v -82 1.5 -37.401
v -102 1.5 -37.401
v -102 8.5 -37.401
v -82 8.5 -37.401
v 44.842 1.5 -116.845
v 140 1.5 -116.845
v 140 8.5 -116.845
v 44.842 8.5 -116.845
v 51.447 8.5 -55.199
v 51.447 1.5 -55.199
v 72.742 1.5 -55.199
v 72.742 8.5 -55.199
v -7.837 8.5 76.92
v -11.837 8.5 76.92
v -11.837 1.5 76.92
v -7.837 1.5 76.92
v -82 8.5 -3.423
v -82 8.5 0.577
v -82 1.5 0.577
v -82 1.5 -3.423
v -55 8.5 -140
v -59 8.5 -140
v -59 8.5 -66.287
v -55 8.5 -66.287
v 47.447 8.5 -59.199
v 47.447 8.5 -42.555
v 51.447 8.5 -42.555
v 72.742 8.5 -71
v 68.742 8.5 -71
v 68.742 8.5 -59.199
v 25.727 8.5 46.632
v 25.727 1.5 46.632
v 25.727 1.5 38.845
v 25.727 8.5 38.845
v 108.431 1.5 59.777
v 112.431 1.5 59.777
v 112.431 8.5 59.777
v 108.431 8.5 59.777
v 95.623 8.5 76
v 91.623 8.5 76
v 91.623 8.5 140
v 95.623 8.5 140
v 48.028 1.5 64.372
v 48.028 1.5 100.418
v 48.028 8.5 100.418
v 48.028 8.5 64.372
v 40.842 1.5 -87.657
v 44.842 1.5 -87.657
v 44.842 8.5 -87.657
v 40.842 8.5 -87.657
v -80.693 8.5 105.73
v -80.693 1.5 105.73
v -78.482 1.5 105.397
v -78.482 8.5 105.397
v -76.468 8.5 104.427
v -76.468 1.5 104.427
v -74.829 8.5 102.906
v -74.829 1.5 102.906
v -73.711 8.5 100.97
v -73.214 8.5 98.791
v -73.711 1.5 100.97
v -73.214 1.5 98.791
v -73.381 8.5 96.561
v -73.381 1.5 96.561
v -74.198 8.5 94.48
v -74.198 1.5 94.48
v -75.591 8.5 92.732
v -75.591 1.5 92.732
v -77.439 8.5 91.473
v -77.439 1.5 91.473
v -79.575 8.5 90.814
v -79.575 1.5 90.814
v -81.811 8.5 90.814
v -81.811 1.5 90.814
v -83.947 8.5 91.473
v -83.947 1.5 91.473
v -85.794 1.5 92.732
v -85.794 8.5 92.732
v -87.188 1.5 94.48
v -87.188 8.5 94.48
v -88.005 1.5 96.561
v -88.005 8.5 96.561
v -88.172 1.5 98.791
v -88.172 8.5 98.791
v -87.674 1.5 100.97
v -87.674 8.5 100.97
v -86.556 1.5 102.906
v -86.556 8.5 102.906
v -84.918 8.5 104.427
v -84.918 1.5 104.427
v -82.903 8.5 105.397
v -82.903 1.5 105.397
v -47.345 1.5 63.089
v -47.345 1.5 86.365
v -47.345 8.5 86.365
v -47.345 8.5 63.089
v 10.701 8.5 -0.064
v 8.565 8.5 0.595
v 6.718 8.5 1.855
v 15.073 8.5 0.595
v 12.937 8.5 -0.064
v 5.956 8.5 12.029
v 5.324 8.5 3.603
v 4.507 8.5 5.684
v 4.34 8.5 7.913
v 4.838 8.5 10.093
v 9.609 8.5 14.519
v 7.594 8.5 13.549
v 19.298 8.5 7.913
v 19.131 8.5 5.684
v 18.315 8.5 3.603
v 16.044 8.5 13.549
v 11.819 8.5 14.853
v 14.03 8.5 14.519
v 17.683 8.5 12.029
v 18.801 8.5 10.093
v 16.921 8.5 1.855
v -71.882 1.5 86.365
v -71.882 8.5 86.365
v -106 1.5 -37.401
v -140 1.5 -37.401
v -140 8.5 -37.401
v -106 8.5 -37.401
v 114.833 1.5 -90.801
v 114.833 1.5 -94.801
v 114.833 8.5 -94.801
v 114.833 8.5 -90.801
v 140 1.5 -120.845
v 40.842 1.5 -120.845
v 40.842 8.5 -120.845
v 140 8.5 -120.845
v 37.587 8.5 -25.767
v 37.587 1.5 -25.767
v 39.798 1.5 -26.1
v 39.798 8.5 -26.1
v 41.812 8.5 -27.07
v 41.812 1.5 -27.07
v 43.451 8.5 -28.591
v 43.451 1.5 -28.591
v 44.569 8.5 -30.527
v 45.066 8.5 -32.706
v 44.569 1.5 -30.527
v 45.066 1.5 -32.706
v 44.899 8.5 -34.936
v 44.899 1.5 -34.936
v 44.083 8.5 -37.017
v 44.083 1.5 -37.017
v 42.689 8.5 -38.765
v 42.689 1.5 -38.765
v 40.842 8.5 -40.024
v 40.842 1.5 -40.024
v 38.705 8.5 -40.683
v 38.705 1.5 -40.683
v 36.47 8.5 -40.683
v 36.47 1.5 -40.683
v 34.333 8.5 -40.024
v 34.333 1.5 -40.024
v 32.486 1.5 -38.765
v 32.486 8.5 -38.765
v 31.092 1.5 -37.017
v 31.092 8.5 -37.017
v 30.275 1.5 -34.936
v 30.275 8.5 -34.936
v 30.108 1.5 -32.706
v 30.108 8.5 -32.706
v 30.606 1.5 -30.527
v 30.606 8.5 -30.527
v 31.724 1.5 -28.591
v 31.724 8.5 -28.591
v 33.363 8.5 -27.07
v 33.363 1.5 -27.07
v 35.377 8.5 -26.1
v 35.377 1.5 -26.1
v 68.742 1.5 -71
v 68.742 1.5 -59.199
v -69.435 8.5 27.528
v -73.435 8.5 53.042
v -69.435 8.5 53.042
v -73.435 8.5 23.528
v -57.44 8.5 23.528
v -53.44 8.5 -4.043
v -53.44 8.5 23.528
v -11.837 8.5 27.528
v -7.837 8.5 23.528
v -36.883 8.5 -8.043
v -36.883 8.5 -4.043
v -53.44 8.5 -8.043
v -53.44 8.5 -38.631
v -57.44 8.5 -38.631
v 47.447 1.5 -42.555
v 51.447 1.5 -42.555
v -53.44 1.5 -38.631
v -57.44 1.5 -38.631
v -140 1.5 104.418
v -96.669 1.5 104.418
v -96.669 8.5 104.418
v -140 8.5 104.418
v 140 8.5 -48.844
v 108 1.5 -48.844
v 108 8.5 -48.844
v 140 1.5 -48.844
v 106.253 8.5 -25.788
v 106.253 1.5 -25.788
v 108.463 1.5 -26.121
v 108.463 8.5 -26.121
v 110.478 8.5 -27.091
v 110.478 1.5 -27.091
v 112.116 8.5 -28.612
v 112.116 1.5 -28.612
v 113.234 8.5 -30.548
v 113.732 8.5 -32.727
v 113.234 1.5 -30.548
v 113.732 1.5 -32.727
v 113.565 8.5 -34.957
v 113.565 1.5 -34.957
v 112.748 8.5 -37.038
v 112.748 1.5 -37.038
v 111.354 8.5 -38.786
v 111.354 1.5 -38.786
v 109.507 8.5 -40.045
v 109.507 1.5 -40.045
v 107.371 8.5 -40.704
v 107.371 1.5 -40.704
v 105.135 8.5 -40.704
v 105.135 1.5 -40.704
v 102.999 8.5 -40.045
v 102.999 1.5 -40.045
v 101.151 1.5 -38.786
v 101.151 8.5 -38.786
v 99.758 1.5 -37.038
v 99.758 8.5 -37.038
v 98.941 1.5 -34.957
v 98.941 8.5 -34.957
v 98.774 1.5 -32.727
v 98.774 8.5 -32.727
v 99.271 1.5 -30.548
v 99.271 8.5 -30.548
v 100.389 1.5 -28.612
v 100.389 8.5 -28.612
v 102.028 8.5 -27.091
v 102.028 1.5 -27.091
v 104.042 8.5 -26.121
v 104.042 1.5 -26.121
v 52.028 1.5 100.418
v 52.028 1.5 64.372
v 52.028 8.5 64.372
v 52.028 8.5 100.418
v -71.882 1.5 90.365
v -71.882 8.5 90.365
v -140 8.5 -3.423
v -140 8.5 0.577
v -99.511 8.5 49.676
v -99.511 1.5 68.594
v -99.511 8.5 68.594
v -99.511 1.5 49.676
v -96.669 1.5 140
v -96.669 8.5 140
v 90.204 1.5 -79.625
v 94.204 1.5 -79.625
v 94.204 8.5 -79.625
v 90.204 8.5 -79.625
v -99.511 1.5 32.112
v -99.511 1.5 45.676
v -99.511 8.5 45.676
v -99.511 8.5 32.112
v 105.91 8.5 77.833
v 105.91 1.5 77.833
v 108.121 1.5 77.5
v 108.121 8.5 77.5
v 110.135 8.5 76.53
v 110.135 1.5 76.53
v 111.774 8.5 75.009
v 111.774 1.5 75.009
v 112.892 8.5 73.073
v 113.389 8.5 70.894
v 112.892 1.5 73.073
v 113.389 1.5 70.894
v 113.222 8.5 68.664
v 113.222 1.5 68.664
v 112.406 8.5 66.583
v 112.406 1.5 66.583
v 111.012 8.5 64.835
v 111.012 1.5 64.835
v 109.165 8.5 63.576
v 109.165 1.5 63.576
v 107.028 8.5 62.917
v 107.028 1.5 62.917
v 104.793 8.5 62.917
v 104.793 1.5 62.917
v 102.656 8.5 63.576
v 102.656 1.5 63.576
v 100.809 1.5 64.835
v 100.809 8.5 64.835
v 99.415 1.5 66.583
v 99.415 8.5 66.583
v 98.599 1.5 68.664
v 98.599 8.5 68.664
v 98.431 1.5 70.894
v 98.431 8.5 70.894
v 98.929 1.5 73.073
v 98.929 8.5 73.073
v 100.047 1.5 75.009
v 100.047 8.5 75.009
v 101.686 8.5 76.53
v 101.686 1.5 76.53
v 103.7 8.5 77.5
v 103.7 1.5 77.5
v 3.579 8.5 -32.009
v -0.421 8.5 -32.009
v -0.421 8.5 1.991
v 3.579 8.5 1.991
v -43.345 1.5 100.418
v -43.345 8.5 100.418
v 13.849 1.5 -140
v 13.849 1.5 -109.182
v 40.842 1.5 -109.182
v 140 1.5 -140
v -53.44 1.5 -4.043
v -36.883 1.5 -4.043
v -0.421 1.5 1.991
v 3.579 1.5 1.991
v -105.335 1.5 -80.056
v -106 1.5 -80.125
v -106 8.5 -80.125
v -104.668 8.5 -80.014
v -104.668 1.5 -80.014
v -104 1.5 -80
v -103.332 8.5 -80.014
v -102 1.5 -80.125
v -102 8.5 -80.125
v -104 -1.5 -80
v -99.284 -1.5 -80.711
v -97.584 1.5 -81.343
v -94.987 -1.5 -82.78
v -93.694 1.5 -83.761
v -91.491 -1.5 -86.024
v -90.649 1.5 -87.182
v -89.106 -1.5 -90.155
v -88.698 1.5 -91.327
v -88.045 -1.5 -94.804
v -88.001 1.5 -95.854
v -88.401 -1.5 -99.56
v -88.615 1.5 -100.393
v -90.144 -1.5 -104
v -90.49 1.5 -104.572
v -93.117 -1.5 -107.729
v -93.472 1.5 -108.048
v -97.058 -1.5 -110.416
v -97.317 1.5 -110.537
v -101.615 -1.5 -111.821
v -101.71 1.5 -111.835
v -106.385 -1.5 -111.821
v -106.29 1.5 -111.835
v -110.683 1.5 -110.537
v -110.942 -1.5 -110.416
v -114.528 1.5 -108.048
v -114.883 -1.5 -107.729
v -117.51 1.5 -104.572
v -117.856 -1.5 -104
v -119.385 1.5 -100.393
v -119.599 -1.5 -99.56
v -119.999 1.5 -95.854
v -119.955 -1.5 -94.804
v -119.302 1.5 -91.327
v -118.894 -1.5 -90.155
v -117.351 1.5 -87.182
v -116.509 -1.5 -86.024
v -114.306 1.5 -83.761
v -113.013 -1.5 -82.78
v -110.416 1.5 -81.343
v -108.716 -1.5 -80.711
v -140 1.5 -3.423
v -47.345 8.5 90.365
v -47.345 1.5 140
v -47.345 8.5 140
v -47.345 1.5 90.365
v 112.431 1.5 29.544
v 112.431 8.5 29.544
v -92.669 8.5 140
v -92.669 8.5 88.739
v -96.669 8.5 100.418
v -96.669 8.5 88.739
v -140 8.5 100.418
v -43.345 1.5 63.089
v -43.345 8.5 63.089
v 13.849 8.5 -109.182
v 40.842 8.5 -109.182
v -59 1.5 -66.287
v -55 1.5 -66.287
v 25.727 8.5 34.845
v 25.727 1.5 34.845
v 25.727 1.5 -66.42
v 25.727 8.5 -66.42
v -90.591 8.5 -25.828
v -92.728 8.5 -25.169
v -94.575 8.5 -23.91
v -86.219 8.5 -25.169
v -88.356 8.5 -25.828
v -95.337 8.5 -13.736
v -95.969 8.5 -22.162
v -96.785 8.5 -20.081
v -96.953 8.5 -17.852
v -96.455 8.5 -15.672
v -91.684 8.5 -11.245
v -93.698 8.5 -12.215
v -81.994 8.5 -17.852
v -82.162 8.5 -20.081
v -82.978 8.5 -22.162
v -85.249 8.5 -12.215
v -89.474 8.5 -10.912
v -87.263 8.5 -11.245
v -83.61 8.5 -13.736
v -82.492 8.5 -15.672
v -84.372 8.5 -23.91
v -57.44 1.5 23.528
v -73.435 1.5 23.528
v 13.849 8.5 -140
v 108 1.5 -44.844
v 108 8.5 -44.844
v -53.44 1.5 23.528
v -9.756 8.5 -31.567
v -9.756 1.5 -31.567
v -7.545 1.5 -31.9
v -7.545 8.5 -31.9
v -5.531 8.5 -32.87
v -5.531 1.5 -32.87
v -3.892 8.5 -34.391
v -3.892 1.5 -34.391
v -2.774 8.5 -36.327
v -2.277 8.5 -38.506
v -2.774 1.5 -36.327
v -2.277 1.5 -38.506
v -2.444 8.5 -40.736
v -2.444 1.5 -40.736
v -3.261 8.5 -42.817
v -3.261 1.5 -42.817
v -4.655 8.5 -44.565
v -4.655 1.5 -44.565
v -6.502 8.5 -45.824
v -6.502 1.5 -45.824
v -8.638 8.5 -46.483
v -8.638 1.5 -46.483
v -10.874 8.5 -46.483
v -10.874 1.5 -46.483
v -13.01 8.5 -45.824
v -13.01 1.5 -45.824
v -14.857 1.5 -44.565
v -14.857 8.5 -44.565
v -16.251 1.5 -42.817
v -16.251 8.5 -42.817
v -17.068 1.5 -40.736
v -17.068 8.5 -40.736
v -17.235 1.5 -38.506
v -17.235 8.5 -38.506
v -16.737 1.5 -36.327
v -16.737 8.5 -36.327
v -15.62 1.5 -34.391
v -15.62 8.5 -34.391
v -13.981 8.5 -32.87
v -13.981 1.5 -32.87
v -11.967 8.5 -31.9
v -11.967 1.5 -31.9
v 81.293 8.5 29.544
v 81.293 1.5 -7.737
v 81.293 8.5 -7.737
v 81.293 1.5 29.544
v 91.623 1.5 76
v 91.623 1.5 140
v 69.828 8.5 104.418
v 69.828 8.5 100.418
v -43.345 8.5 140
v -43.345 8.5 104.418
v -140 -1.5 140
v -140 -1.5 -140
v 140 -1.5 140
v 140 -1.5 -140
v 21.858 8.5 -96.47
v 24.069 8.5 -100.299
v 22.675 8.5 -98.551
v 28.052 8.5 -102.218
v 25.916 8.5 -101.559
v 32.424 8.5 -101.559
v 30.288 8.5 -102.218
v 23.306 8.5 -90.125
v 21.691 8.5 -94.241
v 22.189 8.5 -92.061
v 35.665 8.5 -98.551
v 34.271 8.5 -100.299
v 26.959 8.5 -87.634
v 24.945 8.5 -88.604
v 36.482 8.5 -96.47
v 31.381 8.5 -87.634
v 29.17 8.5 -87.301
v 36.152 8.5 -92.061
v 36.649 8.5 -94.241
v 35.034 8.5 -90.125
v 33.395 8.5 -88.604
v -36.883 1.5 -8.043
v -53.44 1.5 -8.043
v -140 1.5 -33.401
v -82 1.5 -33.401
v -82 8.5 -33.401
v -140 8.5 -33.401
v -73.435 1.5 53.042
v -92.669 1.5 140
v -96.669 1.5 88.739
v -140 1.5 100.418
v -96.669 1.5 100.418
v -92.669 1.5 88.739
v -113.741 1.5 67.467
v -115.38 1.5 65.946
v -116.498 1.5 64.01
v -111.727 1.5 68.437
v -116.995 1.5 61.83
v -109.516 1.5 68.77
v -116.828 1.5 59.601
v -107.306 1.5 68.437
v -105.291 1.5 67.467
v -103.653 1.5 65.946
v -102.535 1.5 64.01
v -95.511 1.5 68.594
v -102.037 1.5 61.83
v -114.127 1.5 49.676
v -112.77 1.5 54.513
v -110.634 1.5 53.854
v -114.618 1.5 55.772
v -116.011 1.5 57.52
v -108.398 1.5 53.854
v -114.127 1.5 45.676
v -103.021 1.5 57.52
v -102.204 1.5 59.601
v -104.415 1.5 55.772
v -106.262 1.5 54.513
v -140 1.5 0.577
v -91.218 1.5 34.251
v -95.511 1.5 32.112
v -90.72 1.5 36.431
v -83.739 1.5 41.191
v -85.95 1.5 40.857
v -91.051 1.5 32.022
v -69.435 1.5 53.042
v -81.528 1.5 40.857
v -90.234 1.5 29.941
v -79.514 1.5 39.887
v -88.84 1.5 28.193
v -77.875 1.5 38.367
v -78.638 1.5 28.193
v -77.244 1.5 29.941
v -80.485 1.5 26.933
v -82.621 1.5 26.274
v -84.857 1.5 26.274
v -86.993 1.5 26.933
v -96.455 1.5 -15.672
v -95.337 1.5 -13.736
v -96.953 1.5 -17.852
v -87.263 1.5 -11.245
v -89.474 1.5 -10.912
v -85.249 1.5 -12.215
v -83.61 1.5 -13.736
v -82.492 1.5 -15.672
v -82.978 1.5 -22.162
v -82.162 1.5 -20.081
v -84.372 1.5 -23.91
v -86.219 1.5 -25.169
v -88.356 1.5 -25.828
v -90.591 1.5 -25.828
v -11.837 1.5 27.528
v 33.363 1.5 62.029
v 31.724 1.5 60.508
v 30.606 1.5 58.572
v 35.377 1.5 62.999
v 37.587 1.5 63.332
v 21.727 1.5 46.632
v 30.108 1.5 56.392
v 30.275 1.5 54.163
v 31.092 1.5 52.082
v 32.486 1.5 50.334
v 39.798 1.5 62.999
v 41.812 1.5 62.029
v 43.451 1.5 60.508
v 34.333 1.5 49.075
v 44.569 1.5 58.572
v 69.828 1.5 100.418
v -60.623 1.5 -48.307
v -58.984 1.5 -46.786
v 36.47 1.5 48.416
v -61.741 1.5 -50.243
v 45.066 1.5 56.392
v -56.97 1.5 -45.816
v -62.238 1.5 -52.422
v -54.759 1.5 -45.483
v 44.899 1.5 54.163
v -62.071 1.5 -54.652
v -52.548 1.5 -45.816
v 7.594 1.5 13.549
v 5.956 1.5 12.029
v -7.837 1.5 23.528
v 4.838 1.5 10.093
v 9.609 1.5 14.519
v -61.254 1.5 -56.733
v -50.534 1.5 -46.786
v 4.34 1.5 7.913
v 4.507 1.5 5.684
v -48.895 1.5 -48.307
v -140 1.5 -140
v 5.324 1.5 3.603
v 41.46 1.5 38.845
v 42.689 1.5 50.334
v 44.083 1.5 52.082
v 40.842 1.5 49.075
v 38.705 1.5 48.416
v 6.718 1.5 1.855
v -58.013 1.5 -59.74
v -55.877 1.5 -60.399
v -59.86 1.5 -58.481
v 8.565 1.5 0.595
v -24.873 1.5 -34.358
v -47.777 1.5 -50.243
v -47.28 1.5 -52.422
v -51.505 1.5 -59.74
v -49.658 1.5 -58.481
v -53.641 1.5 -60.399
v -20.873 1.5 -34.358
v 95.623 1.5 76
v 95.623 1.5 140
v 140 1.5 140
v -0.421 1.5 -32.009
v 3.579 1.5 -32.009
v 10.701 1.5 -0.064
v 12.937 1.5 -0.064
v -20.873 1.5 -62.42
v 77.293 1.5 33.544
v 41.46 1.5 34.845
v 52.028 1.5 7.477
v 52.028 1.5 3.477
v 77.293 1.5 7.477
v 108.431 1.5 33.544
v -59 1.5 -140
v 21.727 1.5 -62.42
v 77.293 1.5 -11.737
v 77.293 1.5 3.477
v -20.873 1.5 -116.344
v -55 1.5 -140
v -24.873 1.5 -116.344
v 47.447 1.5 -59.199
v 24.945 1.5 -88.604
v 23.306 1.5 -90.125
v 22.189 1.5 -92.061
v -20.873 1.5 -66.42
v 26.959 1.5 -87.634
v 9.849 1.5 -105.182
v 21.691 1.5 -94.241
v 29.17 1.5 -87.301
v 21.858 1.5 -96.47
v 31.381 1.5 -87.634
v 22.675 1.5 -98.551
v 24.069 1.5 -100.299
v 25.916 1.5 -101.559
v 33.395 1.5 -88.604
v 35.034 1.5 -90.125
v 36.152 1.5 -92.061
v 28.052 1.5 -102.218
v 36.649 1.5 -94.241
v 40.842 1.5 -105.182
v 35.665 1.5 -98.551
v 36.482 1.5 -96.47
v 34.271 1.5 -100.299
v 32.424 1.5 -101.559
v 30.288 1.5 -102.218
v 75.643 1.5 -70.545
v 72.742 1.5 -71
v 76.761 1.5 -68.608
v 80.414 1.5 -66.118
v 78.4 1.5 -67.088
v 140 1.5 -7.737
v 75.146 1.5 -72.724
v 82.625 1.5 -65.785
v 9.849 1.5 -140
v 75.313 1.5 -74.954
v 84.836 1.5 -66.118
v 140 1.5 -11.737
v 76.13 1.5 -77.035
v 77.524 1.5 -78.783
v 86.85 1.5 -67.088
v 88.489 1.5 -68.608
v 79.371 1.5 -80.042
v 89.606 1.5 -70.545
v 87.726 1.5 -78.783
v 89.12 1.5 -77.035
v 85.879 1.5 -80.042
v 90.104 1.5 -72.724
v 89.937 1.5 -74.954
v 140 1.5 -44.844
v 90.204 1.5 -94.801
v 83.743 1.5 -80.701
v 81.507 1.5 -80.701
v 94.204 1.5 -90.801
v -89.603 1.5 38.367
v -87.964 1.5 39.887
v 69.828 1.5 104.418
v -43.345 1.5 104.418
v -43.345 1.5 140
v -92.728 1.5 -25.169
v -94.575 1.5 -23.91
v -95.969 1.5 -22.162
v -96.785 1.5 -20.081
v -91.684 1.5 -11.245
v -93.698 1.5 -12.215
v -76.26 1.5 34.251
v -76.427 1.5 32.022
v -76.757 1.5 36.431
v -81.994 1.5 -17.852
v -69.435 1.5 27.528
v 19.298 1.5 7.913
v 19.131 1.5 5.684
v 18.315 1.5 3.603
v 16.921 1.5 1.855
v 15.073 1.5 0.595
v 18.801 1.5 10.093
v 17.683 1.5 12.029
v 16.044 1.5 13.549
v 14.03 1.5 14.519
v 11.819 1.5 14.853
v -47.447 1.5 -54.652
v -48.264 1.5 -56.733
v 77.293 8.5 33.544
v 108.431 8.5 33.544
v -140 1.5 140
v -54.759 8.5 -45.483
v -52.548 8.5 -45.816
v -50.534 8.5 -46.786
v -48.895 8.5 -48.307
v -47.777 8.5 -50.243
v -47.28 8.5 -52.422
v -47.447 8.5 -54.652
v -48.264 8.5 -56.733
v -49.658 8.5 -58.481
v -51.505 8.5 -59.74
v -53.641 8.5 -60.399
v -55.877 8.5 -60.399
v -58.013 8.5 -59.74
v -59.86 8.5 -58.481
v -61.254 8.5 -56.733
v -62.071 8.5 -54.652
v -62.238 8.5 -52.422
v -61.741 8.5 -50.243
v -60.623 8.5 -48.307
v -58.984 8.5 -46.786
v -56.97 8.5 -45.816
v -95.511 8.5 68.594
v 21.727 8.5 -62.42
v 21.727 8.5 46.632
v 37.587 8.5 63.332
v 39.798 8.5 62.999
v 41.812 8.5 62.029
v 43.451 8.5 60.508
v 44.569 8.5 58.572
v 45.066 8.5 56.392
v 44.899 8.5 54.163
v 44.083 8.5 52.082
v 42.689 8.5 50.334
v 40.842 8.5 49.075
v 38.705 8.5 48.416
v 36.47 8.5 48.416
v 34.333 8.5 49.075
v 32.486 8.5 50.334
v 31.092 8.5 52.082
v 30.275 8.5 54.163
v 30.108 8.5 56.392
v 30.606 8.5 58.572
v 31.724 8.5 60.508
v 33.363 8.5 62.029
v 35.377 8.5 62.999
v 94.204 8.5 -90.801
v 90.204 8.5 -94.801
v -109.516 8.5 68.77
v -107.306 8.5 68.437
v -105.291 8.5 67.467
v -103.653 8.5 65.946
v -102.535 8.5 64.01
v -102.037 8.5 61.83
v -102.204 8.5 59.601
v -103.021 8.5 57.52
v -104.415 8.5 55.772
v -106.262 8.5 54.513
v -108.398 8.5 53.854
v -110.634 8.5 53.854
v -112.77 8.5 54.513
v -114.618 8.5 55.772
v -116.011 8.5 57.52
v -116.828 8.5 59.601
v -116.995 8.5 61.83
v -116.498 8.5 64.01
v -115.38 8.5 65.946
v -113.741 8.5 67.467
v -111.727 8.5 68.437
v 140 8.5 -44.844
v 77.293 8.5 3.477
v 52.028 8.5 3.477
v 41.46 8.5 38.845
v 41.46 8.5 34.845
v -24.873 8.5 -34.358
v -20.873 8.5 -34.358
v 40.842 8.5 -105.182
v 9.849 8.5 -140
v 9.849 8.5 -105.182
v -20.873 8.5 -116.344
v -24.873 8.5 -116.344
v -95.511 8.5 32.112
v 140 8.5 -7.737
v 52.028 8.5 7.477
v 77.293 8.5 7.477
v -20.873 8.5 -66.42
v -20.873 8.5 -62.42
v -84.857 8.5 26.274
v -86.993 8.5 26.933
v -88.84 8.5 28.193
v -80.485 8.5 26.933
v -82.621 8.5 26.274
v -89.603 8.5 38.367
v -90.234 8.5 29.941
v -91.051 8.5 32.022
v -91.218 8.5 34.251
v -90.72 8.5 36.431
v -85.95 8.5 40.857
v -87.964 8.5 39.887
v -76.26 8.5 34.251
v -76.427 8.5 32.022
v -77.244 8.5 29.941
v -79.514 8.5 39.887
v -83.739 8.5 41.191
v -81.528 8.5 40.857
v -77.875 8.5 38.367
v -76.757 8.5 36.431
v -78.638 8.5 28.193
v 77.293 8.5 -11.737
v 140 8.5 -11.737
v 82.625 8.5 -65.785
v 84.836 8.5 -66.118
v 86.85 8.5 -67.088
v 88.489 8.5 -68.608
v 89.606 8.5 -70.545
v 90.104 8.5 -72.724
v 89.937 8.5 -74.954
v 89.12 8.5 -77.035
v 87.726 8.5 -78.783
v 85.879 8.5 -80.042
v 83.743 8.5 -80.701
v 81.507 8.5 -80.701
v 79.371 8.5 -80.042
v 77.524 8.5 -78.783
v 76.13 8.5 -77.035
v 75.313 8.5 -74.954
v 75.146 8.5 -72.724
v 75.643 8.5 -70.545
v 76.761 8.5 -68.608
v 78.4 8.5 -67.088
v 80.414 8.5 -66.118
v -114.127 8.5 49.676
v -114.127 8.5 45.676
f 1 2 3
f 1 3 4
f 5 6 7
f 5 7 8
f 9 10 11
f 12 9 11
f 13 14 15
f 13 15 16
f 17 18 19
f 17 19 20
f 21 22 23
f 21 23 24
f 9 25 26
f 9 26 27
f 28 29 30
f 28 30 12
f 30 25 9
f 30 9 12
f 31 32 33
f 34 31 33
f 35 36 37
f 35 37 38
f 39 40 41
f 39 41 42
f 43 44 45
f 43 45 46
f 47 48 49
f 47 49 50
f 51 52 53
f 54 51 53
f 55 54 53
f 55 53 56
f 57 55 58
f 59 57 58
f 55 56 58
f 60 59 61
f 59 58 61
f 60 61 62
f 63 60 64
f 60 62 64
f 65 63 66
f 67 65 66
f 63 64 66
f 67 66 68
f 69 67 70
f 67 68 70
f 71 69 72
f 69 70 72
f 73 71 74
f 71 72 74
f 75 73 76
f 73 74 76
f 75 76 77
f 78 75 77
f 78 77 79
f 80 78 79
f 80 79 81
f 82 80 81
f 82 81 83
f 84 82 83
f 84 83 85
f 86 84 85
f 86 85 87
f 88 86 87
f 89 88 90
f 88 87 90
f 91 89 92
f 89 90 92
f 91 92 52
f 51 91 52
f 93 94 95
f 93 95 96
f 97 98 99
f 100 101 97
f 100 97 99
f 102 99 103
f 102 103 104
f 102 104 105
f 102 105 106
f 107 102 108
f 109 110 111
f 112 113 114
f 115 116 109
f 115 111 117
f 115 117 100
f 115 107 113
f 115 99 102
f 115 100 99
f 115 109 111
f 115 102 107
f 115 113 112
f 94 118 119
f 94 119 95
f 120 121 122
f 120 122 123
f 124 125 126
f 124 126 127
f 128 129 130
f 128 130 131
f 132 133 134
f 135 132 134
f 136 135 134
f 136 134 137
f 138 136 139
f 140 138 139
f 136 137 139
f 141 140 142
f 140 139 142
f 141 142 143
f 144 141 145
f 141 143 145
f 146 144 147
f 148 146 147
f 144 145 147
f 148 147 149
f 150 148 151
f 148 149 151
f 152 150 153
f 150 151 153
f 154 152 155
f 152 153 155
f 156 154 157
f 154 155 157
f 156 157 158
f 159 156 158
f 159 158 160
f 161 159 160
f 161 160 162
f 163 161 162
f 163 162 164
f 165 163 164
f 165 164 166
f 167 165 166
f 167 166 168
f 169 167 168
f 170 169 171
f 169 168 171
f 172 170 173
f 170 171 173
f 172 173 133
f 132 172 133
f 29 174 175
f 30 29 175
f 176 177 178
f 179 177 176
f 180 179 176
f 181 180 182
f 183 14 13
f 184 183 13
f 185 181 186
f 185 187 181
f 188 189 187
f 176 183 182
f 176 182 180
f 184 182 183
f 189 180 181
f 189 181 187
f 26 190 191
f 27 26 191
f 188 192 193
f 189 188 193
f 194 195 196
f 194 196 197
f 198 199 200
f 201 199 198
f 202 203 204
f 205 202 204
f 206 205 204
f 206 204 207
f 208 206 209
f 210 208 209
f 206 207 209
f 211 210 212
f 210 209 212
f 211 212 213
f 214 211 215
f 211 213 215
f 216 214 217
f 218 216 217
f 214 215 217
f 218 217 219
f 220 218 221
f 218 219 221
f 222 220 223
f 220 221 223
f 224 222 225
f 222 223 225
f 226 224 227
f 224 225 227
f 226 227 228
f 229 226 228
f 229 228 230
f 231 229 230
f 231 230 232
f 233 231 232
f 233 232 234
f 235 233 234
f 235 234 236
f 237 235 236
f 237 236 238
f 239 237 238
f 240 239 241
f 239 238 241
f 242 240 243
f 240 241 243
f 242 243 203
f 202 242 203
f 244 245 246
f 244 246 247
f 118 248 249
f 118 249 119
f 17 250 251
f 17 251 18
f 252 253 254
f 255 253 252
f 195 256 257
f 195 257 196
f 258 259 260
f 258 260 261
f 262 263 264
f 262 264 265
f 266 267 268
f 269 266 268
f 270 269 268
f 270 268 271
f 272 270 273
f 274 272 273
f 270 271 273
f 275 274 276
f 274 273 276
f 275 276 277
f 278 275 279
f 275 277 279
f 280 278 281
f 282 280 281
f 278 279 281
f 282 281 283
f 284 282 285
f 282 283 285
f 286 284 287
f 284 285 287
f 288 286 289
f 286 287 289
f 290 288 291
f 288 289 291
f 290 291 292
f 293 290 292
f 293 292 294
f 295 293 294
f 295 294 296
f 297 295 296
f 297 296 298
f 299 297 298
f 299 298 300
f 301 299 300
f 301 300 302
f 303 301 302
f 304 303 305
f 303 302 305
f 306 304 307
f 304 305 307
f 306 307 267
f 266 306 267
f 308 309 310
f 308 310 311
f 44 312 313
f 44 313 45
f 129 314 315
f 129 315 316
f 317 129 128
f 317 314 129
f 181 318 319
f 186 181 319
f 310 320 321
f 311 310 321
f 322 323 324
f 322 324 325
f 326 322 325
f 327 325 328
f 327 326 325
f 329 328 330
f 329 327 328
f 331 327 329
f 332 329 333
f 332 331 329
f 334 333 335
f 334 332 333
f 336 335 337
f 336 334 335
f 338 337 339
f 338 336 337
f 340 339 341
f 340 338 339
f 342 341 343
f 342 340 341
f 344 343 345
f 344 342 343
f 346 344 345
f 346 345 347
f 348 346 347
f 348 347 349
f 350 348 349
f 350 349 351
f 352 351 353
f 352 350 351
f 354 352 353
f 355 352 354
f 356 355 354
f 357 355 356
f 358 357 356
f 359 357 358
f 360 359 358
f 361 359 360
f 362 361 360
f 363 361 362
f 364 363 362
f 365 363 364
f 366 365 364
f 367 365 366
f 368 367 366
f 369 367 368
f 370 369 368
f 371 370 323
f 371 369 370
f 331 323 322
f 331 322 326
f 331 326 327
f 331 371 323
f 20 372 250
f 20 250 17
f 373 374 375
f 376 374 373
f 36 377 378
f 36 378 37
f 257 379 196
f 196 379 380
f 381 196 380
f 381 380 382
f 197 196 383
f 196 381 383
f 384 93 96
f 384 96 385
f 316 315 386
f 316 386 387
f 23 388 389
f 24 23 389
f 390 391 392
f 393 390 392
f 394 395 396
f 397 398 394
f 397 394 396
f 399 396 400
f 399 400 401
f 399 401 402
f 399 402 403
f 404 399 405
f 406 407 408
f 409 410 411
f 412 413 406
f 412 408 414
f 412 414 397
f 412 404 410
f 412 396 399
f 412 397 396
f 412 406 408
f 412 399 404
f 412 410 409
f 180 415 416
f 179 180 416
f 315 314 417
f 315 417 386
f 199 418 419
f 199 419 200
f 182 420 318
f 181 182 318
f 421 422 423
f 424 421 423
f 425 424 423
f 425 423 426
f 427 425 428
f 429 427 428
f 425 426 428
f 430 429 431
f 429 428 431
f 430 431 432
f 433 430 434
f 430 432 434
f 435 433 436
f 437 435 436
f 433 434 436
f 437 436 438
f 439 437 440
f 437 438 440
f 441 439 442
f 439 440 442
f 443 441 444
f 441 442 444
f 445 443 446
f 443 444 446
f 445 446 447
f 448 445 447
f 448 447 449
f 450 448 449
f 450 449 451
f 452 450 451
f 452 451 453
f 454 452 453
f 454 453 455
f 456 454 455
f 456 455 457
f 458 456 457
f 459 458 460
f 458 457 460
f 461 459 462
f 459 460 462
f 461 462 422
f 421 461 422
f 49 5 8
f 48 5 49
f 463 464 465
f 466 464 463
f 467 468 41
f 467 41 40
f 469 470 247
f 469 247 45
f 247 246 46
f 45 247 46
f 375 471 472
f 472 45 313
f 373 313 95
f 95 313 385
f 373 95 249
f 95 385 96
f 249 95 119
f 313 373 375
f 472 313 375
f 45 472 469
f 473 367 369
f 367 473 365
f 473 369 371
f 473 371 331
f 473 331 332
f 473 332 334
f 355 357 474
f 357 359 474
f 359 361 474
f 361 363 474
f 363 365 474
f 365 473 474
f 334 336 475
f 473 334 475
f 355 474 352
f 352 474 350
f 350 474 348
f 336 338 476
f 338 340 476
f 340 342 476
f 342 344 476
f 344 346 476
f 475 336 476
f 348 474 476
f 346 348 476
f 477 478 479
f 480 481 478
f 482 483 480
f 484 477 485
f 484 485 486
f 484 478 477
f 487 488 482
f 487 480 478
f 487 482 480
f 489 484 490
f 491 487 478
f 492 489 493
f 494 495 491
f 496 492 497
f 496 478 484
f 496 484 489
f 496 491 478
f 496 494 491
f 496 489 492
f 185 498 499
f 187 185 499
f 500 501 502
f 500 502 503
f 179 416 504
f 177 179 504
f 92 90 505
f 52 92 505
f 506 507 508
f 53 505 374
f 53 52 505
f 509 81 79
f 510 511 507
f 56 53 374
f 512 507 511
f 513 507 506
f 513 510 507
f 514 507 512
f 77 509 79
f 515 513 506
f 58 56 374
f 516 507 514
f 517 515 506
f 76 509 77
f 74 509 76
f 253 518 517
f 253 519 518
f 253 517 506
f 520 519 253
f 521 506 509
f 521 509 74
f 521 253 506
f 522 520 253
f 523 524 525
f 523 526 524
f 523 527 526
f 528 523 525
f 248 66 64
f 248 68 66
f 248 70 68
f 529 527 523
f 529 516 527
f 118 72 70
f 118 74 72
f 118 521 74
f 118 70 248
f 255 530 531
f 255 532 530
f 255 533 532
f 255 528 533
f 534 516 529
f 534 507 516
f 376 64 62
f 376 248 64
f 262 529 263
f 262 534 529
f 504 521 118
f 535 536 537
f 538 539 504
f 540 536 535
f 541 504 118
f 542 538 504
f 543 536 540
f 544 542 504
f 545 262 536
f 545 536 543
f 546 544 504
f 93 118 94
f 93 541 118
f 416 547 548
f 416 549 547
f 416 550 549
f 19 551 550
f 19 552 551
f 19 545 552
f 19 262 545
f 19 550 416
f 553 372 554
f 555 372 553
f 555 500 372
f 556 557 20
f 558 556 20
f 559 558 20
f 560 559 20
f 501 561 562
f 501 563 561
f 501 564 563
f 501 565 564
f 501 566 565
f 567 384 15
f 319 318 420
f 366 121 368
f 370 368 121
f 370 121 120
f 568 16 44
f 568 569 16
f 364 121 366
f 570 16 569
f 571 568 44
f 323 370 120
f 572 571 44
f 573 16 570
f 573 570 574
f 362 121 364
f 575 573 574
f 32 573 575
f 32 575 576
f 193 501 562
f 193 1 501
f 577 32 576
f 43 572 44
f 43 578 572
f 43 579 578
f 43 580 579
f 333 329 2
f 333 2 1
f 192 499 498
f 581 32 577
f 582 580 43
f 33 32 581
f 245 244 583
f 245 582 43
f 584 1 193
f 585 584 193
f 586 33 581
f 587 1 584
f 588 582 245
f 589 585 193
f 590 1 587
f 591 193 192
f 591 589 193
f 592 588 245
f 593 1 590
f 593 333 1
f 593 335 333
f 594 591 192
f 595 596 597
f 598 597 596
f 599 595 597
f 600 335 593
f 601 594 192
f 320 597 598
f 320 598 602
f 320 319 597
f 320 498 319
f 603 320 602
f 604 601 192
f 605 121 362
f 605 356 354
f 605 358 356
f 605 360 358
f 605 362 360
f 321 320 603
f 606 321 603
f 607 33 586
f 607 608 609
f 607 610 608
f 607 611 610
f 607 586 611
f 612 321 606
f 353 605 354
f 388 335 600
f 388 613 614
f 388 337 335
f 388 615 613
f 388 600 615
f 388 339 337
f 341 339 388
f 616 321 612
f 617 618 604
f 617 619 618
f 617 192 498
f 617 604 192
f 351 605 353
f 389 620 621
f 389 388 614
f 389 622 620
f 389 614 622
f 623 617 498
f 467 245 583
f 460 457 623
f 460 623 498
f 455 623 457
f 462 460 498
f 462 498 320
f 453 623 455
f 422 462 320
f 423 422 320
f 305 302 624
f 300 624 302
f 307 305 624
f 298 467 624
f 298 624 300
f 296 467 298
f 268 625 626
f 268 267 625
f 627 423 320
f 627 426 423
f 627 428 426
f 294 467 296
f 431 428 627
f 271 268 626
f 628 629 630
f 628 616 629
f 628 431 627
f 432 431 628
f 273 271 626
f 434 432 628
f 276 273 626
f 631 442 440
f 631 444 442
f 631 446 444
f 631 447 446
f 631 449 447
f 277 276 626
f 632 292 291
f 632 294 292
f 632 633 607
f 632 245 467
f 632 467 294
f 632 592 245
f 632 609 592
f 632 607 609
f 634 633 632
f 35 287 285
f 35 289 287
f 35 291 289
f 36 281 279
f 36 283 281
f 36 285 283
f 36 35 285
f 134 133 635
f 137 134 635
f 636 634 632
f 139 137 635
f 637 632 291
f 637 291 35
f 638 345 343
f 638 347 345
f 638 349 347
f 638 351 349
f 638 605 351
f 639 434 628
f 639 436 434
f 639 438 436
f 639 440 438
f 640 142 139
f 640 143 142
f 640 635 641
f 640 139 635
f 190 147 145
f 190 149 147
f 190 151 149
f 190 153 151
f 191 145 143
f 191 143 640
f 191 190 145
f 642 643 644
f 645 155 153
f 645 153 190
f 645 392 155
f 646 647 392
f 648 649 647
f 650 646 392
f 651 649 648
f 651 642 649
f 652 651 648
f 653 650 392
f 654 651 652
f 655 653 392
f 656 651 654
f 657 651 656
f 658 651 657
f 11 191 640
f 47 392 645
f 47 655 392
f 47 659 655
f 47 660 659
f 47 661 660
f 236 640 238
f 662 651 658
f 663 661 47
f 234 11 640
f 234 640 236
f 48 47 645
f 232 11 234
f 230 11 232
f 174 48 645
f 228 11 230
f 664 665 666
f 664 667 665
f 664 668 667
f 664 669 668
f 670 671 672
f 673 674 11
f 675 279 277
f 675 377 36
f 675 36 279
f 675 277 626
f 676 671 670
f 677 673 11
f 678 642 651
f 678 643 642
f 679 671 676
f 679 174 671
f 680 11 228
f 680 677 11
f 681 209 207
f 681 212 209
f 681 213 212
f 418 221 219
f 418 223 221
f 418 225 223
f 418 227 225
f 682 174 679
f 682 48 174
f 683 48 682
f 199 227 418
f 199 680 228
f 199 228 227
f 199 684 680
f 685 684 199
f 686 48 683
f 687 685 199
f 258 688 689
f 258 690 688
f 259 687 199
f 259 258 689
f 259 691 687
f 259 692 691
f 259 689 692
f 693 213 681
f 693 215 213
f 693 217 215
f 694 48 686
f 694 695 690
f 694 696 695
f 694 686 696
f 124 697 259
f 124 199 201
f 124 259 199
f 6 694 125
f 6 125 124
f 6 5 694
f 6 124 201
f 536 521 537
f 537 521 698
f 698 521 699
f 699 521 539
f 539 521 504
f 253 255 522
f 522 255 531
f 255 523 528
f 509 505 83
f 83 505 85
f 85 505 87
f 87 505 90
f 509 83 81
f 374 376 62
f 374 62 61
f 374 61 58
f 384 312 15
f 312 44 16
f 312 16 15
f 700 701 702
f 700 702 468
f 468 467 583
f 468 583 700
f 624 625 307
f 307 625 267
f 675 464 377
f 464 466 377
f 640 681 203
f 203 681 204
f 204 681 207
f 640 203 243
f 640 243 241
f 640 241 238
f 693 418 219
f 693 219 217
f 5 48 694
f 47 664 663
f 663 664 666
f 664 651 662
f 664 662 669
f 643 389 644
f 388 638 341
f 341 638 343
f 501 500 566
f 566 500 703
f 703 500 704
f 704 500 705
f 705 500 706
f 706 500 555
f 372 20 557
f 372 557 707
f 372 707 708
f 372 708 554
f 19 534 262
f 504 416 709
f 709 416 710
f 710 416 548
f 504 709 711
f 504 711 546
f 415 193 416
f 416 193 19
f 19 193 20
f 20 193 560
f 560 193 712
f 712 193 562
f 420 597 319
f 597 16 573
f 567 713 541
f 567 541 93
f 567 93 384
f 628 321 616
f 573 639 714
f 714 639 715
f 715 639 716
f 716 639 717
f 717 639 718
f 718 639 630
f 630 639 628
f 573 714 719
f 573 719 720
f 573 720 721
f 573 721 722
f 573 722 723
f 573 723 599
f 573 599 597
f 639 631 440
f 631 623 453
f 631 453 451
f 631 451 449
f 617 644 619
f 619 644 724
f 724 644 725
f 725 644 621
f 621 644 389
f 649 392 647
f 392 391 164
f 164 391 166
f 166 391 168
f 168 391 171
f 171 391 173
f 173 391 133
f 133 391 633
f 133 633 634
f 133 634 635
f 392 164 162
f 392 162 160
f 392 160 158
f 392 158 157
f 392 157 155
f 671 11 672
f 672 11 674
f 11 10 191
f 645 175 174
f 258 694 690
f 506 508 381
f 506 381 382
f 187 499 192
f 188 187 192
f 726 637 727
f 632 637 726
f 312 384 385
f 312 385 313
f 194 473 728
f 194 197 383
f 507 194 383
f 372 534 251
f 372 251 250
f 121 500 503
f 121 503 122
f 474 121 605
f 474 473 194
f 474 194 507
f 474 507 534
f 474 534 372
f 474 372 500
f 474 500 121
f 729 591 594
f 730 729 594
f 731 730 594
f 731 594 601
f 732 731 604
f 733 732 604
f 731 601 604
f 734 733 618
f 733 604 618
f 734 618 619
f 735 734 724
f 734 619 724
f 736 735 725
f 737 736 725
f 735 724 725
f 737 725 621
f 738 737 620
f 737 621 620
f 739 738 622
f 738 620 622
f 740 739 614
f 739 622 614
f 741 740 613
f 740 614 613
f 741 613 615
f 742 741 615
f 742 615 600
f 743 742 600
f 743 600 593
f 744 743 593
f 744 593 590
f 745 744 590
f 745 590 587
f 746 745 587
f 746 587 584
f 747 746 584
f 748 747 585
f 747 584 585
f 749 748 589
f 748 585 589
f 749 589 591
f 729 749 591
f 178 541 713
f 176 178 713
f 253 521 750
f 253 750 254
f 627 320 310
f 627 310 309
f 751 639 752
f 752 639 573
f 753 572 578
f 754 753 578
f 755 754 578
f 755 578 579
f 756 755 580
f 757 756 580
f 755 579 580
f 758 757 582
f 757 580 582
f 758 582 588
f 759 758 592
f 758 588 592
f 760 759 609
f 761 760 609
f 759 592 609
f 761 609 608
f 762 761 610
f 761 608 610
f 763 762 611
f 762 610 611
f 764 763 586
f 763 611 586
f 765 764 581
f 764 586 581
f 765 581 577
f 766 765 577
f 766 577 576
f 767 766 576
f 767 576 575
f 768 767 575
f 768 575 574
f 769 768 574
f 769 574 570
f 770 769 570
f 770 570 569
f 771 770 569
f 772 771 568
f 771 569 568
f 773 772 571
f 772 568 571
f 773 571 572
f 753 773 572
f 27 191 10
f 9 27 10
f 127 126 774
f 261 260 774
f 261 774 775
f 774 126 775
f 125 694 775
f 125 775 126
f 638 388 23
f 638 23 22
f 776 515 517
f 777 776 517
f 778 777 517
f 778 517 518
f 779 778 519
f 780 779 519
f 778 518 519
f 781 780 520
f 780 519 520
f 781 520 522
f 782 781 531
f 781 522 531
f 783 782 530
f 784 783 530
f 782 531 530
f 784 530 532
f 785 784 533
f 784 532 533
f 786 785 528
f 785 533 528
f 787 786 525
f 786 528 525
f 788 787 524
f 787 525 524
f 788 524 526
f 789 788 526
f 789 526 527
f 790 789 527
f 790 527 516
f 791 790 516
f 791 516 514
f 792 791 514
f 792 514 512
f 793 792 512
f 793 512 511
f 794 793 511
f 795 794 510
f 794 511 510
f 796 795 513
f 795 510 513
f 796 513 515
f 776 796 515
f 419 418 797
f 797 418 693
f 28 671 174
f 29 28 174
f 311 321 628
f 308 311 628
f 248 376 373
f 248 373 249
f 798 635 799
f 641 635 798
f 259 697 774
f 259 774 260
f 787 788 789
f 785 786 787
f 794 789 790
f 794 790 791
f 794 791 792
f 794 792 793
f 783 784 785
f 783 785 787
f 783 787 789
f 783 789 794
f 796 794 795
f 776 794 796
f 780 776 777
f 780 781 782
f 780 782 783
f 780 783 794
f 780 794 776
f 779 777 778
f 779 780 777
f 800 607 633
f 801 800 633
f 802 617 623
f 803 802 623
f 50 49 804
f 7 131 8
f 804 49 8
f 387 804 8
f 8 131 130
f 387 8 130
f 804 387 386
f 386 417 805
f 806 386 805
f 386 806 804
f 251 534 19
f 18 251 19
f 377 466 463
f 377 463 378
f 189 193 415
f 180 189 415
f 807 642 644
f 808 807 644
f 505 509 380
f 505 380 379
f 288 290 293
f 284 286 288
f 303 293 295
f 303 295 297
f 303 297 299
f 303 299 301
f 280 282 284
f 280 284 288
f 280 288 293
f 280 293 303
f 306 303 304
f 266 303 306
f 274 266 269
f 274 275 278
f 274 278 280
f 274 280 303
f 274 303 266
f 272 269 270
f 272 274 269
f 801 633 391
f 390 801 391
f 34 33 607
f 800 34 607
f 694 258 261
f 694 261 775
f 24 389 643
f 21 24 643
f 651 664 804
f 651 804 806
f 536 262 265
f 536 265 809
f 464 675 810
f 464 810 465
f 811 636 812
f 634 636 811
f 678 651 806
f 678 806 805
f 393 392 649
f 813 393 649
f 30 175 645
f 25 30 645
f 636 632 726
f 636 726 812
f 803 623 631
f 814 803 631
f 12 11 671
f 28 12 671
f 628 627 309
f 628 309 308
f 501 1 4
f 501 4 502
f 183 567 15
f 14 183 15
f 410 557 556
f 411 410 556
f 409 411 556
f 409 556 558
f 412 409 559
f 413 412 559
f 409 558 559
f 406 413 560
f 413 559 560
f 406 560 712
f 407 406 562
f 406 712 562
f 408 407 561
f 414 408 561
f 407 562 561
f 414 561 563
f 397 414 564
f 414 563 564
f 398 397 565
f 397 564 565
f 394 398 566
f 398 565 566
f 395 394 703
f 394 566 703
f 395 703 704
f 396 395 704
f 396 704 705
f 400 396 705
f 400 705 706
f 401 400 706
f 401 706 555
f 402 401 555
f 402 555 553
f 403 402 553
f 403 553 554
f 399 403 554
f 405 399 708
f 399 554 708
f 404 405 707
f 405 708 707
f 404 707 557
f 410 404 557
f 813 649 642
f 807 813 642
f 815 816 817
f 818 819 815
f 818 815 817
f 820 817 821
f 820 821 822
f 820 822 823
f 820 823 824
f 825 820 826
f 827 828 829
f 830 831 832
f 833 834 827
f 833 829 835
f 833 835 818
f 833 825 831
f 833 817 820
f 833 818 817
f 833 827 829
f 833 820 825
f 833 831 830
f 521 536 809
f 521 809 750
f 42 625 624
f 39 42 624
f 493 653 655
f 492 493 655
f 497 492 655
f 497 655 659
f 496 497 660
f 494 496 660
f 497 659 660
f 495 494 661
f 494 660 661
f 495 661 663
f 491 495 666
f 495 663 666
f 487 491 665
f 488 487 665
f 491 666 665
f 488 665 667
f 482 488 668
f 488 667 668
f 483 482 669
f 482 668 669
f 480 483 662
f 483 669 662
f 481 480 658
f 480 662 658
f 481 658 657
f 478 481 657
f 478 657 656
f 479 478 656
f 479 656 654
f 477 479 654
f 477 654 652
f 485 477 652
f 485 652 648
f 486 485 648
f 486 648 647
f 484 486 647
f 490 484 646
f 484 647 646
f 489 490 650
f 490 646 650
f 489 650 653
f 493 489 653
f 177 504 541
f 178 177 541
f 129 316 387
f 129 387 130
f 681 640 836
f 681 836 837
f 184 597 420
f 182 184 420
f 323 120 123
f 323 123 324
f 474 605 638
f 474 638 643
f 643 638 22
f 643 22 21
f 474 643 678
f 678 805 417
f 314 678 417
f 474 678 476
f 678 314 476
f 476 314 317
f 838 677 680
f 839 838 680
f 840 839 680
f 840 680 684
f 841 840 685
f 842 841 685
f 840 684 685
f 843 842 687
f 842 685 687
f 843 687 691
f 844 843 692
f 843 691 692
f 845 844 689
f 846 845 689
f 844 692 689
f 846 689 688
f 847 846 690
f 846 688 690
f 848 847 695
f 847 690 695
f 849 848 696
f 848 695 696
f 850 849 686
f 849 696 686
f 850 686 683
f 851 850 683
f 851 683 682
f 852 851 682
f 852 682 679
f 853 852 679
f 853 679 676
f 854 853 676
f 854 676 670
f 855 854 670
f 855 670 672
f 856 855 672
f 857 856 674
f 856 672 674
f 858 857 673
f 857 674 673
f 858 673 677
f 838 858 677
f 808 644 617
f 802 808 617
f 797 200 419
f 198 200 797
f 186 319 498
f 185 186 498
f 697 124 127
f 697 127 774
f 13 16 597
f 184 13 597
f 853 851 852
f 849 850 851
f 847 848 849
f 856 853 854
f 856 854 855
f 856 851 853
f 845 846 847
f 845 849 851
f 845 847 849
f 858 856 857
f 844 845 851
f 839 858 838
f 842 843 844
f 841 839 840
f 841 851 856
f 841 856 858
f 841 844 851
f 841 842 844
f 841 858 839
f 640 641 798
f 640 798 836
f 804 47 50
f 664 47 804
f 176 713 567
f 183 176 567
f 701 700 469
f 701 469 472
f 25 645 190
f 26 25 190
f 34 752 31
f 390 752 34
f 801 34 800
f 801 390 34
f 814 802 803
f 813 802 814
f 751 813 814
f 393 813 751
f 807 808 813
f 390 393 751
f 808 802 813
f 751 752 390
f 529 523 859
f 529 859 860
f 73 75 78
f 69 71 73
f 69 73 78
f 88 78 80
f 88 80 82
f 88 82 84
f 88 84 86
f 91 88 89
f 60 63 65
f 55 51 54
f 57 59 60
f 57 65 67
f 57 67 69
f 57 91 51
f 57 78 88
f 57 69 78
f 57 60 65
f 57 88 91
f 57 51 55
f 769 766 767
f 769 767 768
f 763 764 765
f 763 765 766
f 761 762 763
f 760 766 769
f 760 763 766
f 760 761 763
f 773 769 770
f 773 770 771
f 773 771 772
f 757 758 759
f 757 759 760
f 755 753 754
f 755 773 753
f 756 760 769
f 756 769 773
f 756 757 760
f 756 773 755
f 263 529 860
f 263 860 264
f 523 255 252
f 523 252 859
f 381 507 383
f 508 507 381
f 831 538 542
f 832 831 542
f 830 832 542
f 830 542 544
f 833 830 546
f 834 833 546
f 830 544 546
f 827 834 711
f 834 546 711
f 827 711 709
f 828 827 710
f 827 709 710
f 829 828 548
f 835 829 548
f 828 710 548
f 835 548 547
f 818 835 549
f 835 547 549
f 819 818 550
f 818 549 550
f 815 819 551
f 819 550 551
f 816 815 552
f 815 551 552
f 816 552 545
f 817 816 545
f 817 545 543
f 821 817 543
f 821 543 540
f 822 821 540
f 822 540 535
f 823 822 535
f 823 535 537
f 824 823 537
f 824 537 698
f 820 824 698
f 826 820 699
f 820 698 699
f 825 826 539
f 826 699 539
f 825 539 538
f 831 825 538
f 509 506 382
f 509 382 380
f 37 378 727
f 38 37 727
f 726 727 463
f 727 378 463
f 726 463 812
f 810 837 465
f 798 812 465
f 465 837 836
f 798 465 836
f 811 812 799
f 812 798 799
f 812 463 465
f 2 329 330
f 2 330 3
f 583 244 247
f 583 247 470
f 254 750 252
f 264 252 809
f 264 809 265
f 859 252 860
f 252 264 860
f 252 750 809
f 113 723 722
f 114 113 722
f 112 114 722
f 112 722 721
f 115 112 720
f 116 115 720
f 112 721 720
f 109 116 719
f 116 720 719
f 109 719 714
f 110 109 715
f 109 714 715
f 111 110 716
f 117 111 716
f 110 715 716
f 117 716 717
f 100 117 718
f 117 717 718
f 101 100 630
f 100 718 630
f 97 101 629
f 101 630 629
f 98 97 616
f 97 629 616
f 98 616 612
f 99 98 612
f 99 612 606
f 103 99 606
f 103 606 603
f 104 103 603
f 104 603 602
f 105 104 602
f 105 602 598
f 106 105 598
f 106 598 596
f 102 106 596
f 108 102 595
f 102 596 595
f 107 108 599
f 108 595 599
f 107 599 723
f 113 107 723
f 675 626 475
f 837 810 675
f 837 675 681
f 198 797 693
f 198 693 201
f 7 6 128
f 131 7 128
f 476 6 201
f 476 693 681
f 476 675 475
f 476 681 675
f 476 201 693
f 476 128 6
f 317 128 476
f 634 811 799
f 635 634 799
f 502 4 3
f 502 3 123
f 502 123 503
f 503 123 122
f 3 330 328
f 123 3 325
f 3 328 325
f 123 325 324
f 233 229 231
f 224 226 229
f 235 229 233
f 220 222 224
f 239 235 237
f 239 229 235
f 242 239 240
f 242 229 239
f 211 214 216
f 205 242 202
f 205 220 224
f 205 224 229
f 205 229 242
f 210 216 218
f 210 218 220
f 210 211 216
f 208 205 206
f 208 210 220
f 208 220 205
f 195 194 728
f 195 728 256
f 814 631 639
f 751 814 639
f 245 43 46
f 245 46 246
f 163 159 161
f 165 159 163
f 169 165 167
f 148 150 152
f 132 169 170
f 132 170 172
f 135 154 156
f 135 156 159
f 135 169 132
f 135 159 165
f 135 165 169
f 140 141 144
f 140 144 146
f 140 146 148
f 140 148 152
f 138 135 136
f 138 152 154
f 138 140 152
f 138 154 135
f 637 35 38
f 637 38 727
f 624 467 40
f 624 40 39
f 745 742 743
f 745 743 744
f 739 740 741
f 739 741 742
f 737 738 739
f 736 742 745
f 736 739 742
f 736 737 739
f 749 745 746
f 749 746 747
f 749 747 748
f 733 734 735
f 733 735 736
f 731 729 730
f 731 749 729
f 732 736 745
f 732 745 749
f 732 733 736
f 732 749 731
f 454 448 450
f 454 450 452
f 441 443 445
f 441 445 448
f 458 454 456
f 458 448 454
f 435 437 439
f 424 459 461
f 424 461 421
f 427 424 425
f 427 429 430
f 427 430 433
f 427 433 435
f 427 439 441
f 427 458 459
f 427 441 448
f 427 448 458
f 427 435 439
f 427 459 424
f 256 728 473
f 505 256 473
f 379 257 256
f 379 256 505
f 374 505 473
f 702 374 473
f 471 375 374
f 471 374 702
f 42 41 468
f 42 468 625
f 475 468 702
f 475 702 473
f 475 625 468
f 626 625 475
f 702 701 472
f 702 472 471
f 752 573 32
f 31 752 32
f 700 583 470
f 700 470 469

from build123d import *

# Parameters (mm, degrees)
SKETCH1_W           = 280
SKETCH1_H           = 280
SKETCH1_R           = 16
BOSS_EXTRUDE1_DEPTH = 1.5
SKETCH2_R           = 7.5
SKETCH2_W           = 4
SKETCH2_H           = 73.713198053
SKETCH2_W_2         = 58
SKETCH2_H_2         = 4
SKETCH2_H_3         = 64
SKETCH2_W_3         = 32
SKETCH2_H_4         = 34
BOSS_EXTRUDE2_DEPTH = 7


with BuildPart() as part:
    # Sketch1 → Boss-Extrude1 (new, symmetric)
    with BuildSketch(Plane(origin=(0, 0, 0), x_dir=(1, 0, 0), z_dir=(0, 1, 0))):
        Rectangle(SKETCH1_W, SKETCH1_H)
        with Locations(Location((-104, 96, 0), (0, 0, 270))):
            Circle(SKETCH1_R, mode=Mode.SUBTRACT)
    extrude(amount=BOSS_EXTRUDE1_DEPTH, both=True)

    # Sketch2 → Boss-Extrude2 (add)
    with BuildSketch(Plane(origin=(0, 1.5, 0), x_dir=(1, 0, 0), z_dir=(0, 1, 0))):
        with Locations(Location((-54.759044634, 52.982810669, 0), (0, 0, 270))):
            Circle(SKETCH2_R)
        with Locations(Location((-89.473504534, 18.412044198, 0), (0, 0, 270))):
            Circle(SKETCH2_R)
        with Locations(Location((-83.738928303, -33.690548853, 0), (0, 0, 270))):
            Circle(SKETCH2_R)
        with Locations(Location((-109.516269096, -61.269929812, 0), (0, 0, 270))):
            Circle(SKETCH2_R)
        with Locations(Location((-80.69273369, -98.230062392, 0), (0, 0, 270))):
            Circle(SKETCH2_R)
        with Locations(Location((37.587423323, -55.831973409, 0), (0, 0, 270))):
            Circle(SKETCH2_R)
        with Locations(Location((105.9104653, -70.333190482, 0), (0, 0, 270))):
            Circle(SKETCH2_R)
        with Locations(Location((11.819316554, -7.352500668, 0), (0, 0, 270))):
            Circle(SKETCH2_R)
        with Locations(Location((-9.755931913, 39.066973306, 0), (0, 0, 270))):
            Circle(SKETCH2_R)
        with Locations(Location((29.170109307, 94.80128466, 0), (0, 0, 270))):
            Circle(SKETCH2_R)
        with Locations(Location((82.624857116, 73.284632448, 0), (0, 0, 270))):
            Circle(SKETCH2_R)
        with Locations(Location((37.587423323, 33.266850719, 0), (0, 0, 270))):
            Circle(SKETCH2_R)
        with Locations(Location((106.252694304, 33.287862382, 0), (0, 0, 270))):
            Circle(SKETCH2_R)
        with Locations((-57, 103.143400974)):
            Rectangle(SKETCH2_W, SKETCH2_H)
        with BuildLine():
            Line((-140, 37.400802204), (-106, 37.400802204))
            Line((-106, 37.400802204), (-106, 80.125492134))
            ThreePointArc((-106, 80.125492134), (-104, 80), (-102, 80.125492134))
            Line((-102, 80.125492134), (-102, 37.400802204))
            Line((-102, 37.400802204), (-82, 37.400802204))
            Line((-82, 37.400802204), (-82, 33.400802204))
            Line((-82, 33.400802204), (-140, 33.400802204))
            Line((-140, 33.400802204), (-140, 37.400802204))
        make_face()
        Polygon((-140, -100.418377476), (-96.668523278, -100.418377476), (-96.668523278, -88.738640334), (-92.668523278, -88.738640334), (-92.668523278, -140), (-96.668523278, -140), (-96.668523278, -104.418377476), (-140, -104.418377476), align=None)
        with Locations((-111, 1.423286191)):
            Rectangle(SKETCH2_W_2, SKETCH2_H_2)
        Polygon((-47.345115434, -140), (-47.345115434, -90.364557891), (-71.881878867, -90.364557891), (-71.881878867, -86.364557891), (-47.345115434, -86.364557891), (-47.345115434, -63.088559208), (-43.345115434, -63.088559208), (-43.345115434, -100.418377476), (48.027751829, -100.418377476), (48.027751829, -64.371939455), (52.027751829, -64.371939455), (52.027751829, -100.418377476), (69.827851451, -100.418377476), (69.827851451, -104.418377476), (-43.345115434, -104.418377476), (-43.345115434, -140), align=None)
        Polygon((140, 7.737266613), (81.293142587, 7.737266613), (81.293142587, -29.543544834), (112.431248518, -29.543544834), (112.431248518, -59.777272974), (108.431248518, -59.777272974), (108.431248518, -33.543544834), (77.293142587, -33.543544834), (77.293142587, -7.47679166), (52.027751829, -7.47679166), (52.027751829, -3.47679166), (77.293142587, -3.47679166), (77.293142587, 11.737266613), (140, 11.737266613), align=None)
        with Locations((93.622601552, -108)):
            Rectangle(SKETCH2_W, SKETCH2_H_3)
        Polygon((-99.510735812, -32.111868954), (-95.510735812, -32.111868954), (-95.510735812, -68.594238703), (-99.510735812, -68.594238703), (-99.510735812, -49.675826938), (-114.127069846, -49.675826938), (-114.127069846, -45.675826938), (-99.510735812, -45.675826938), align=None)
        with Locations((124, 46.843999527)):
            Rectangle(SKETCH2_W_3, SKETCH2_H_2)
        Polygon((-73.435195895, -53.042459291), (-69.435195895, -53.042459291), (-69.435195895, -27.528186601), (-11.837088751, -27.528186601), (-11.837088751, -76.919702569), (-7.837088751, -76.919702569), (-7.837088751, -23.528186601), (-53.440050937, -23.528186601), (-53.440050937, 4.043094912), (-36.882667743, 4.043094912), (-36.882667743, 8.043094912), (-53.440050937, 8.043094912), (-53.440050937, 38.63118777), (-57.440050937, 38.63118777), (-57.440050937, -23.528186601), (-73.435195895, -23.528186601), align=None)
        Polygon((114.833141636, 94.80128466), (114.833141636, 90.80128466), (94.203549623, 90.80128466), (94.203549623, 79.625492134), (90.203549623, 79.625492134), (90.203549623, 94.80128466), align=None)
        with Locations((1.57904958, 15.009472223)):
            Rectangle(SKETCH2_W, SKETCH2_H_4)
        Polygon((68.742119222, 71), (68.742119222, 59.19860167), (47.447056499, 59.19860167), (47.447056499, 42.554658178), (51.447056499, 42.554658178), (51.447056499, 55.19860167), (72.742119222, 55.19860167), (72.742119222, 71), align=None)
        Polygon((21.727135977, -46.6315684), (25.727135977, -46.6315684), (25.727135977, -38.844500644), (41.459511743, -38.844500644), (41.459511743, -34.844500644), (25.727135977, -34.844500644), (25.727135977, 66.420221849), (-20.87255933, 66.420221849), (-20.87255933, 116.344219933), (-24.87255933, 116.344219933), (-24.87255933, 34.358038326), (-20.87255933, 34.358038326), (-20.87255933, 62.420221849), (21.727135977, 62.420221849), align=None)
        Polygon((140, 116.845058218), (44.841725693, 116.845058218), (44.841725693, 87.65657302), (40.841725693, 87.65657302), (40.841725693, 105.182034885), (9.848778982, 105.182034885), (9.848778982, 140), (13.848778982, 140), (13.848778982, 109.182034885), (40.841725693, 109.182034885), (40.841725693, 120.845058218), (140, 120.845058218), align=None)
    extrude(amount=BOSS_EXTRUDE2_DEPTH)


solid = part.part
